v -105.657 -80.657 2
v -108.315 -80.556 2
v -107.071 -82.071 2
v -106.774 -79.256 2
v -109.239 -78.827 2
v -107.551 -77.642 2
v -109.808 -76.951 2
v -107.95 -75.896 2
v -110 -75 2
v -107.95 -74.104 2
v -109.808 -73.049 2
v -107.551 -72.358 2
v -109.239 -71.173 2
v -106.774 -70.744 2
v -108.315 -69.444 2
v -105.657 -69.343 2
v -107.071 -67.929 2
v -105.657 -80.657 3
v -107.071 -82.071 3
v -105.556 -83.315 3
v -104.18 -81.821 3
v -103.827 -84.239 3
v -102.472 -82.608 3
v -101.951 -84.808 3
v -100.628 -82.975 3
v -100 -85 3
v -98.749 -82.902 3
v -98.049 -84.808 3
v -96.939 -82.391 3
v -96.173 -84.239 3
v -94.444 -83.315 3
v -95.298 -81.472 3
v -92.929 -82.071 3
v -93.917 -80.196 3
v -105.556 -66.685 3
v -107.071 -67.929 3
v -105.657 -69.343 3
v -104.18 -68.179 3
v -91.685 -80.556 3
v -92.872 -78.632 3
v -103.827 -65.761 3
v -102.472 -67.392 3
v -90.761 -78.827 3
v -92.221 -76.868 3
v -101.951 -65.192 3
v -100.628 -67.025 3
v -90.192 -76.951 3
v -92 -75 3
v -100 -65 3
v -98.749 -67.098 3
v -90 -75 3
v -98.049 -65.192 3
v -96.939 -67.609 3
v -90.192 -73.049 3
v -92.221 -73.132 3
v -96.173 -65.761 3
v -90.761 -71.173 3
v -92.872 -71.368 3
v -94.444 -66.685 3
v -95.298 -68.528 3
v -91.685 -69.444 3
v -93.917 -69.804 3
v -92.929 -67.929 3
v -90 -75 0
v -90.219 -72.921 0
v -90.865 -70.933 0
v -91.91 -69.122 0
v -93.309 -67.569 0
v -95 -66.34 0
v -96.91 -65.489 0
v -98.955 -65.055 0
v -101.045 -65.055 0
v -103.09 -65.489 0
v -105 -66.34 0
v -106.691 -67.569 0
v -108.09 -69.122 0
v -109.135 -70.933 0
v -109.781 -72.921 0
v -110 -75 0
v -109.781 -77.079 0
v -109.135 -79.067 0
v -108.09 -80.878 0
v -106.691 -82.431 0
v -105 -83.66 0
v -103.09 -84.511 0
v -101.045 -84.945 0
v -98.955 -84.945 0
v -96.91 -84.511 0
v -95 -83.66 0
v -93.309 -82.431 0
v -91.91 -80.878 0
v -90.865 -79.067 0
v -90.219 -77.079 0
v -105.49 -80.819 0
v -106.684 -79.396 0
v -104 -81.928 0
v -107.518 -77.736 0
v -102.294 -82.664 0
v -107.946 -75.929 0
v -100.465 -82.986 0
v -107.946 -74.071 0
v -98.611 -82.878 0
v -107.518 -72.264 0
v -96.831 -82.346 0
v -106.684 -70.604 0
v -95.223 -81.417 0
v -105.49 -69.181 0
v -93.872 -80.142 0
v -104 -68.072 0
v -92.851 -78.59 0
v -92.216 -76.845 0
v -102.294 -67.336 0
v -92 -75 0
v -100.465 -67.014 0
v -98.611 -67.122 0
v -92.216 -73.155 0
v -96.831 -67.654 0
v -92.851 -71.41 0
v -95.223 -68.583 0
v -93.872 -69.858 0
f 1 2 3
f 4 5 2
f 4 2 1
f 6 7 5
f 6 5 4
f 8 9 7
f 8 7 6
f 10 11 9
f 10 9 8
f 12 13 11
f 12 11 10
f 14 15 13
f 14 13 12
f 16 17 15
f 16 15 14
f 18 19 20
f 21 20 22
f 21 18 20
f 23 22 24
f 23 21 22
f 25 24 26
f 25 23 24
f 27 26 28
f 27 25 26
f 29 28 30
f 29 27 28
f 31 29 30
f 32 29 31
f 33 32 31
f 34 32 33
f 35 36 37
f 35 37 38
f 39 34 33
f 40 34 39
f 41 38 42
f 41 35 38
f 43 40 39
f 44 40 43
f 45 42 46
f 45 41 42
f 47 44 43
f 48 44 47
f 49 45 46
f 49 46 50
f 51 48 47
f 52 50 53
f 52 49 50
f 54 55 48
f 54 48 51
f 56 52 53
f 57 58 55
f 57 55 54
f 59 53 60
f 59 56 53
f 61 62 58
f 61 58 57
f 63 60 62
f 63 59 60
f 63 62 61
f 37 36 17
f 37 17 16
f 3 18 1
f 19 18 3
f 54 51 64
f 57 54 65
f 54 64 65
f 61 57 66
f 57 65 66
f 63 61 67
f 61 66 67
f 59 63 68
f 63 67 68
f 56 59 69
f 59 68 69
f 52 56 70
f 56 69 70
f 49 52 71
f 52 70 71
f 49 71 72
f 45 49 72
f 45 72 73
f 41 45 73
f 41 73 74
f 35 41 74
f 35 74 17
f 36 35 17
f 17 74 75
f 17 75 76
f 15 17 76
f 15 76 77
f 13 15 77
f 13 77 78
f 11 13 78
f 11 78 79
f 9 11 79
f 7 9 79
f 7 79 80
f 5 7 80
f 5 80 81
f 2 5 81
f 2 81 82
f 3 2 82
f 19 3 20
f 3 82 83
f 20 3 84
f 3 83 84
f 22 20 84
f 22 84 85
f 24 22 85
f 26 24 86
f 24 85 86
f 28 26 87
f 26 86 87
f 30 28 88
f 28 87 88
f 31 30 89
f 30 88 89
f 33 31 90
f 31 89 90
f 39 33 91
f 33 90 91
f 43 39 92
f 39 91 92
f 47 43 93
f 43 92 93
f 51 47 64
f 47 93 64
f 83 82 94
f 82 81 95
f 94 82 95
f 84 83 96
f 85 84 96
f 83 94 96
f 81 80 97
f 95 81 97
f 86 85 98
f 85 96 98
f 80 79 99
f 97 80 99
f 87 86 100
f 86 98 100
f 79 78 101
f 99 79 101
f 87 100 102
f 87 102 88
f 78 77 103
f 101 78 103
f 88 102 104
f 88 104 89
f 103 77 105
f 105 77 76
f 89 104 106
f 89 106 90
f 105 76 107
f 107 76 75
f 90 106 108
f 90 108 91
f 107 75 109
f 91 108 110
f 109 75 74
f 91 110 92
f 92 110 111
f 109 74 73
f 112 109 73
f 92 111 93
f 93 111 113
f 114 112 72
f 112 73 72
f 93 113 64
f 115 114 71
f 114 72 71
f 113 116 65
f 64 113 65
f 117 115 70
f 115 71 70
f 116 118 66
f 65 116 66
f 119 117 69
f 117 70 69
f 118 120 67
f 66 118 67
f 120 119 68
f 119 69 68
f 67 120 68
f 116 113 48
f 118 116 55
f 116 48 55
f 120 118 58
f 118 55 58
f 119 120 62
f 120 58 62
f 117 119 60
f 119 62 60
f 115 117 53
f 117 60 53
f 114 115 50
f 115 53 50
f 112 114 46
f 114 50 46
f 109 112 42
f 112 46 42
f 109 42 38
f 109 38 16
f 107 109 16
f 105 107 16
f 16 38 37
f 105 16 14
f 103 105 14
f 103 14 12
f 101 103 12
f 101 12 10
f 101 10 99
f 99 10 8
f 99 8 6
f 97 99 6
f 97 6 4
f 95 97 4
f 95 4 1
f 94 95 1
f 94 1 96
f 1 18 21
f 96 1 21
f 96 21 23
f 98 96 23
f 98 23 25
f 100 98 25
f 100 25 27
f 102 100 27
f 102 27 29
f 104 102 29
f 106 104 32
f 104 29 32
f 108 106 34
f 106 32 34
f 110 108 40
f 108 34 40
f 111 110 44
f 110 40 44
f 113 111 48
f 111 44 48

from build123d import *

# Parameters (mm, degrees)
SKETCH010_R     = 10
PAD002_DEPTH    = 3
SKETCH011_R     = 8
POCKET008_DEPTH = 5
POCKET009_DEPTH = 1


with BuildPart() as part:
    # Sketch010 → Pad002 (new body)
    with BuildSketch(Plane.XY):
        Circle(SKETCH010_R)
    extrude(amount=PAD002_DEPTH)

    # Sketch011 → Pocket008 (cut)
    with BuildSketch(Plane.XY.offset(3)):
        Circle(SKETCH011_R)
    extrude(amount=-POCKET008_DEPTH, mode=Mode.SUBTRACT)

    # Sketch012 (on Face3 of Pocket008) → Pocket009 (cut)
    with BuildSketch(Plane.XY.offset(3)):
        with BuildLine():
            ThreePointArc((-7.07107, 7.071066), (-10, -2e-06), (-7.071068, -7.071068))
            Line((0, 0), (-7.071068, -7.071068))
            Line((-7.07107, 7.071066), (0, 0))
        make_face()
    extrude(amount=-POCKET009_DEPTH, mode=Mode.SUBTRACT)


with BuildPart() as part_1:
    # Body003 placement: moved
    add(part.part.moved(Location((-100, -75, 0))))


solid = part_1.part
